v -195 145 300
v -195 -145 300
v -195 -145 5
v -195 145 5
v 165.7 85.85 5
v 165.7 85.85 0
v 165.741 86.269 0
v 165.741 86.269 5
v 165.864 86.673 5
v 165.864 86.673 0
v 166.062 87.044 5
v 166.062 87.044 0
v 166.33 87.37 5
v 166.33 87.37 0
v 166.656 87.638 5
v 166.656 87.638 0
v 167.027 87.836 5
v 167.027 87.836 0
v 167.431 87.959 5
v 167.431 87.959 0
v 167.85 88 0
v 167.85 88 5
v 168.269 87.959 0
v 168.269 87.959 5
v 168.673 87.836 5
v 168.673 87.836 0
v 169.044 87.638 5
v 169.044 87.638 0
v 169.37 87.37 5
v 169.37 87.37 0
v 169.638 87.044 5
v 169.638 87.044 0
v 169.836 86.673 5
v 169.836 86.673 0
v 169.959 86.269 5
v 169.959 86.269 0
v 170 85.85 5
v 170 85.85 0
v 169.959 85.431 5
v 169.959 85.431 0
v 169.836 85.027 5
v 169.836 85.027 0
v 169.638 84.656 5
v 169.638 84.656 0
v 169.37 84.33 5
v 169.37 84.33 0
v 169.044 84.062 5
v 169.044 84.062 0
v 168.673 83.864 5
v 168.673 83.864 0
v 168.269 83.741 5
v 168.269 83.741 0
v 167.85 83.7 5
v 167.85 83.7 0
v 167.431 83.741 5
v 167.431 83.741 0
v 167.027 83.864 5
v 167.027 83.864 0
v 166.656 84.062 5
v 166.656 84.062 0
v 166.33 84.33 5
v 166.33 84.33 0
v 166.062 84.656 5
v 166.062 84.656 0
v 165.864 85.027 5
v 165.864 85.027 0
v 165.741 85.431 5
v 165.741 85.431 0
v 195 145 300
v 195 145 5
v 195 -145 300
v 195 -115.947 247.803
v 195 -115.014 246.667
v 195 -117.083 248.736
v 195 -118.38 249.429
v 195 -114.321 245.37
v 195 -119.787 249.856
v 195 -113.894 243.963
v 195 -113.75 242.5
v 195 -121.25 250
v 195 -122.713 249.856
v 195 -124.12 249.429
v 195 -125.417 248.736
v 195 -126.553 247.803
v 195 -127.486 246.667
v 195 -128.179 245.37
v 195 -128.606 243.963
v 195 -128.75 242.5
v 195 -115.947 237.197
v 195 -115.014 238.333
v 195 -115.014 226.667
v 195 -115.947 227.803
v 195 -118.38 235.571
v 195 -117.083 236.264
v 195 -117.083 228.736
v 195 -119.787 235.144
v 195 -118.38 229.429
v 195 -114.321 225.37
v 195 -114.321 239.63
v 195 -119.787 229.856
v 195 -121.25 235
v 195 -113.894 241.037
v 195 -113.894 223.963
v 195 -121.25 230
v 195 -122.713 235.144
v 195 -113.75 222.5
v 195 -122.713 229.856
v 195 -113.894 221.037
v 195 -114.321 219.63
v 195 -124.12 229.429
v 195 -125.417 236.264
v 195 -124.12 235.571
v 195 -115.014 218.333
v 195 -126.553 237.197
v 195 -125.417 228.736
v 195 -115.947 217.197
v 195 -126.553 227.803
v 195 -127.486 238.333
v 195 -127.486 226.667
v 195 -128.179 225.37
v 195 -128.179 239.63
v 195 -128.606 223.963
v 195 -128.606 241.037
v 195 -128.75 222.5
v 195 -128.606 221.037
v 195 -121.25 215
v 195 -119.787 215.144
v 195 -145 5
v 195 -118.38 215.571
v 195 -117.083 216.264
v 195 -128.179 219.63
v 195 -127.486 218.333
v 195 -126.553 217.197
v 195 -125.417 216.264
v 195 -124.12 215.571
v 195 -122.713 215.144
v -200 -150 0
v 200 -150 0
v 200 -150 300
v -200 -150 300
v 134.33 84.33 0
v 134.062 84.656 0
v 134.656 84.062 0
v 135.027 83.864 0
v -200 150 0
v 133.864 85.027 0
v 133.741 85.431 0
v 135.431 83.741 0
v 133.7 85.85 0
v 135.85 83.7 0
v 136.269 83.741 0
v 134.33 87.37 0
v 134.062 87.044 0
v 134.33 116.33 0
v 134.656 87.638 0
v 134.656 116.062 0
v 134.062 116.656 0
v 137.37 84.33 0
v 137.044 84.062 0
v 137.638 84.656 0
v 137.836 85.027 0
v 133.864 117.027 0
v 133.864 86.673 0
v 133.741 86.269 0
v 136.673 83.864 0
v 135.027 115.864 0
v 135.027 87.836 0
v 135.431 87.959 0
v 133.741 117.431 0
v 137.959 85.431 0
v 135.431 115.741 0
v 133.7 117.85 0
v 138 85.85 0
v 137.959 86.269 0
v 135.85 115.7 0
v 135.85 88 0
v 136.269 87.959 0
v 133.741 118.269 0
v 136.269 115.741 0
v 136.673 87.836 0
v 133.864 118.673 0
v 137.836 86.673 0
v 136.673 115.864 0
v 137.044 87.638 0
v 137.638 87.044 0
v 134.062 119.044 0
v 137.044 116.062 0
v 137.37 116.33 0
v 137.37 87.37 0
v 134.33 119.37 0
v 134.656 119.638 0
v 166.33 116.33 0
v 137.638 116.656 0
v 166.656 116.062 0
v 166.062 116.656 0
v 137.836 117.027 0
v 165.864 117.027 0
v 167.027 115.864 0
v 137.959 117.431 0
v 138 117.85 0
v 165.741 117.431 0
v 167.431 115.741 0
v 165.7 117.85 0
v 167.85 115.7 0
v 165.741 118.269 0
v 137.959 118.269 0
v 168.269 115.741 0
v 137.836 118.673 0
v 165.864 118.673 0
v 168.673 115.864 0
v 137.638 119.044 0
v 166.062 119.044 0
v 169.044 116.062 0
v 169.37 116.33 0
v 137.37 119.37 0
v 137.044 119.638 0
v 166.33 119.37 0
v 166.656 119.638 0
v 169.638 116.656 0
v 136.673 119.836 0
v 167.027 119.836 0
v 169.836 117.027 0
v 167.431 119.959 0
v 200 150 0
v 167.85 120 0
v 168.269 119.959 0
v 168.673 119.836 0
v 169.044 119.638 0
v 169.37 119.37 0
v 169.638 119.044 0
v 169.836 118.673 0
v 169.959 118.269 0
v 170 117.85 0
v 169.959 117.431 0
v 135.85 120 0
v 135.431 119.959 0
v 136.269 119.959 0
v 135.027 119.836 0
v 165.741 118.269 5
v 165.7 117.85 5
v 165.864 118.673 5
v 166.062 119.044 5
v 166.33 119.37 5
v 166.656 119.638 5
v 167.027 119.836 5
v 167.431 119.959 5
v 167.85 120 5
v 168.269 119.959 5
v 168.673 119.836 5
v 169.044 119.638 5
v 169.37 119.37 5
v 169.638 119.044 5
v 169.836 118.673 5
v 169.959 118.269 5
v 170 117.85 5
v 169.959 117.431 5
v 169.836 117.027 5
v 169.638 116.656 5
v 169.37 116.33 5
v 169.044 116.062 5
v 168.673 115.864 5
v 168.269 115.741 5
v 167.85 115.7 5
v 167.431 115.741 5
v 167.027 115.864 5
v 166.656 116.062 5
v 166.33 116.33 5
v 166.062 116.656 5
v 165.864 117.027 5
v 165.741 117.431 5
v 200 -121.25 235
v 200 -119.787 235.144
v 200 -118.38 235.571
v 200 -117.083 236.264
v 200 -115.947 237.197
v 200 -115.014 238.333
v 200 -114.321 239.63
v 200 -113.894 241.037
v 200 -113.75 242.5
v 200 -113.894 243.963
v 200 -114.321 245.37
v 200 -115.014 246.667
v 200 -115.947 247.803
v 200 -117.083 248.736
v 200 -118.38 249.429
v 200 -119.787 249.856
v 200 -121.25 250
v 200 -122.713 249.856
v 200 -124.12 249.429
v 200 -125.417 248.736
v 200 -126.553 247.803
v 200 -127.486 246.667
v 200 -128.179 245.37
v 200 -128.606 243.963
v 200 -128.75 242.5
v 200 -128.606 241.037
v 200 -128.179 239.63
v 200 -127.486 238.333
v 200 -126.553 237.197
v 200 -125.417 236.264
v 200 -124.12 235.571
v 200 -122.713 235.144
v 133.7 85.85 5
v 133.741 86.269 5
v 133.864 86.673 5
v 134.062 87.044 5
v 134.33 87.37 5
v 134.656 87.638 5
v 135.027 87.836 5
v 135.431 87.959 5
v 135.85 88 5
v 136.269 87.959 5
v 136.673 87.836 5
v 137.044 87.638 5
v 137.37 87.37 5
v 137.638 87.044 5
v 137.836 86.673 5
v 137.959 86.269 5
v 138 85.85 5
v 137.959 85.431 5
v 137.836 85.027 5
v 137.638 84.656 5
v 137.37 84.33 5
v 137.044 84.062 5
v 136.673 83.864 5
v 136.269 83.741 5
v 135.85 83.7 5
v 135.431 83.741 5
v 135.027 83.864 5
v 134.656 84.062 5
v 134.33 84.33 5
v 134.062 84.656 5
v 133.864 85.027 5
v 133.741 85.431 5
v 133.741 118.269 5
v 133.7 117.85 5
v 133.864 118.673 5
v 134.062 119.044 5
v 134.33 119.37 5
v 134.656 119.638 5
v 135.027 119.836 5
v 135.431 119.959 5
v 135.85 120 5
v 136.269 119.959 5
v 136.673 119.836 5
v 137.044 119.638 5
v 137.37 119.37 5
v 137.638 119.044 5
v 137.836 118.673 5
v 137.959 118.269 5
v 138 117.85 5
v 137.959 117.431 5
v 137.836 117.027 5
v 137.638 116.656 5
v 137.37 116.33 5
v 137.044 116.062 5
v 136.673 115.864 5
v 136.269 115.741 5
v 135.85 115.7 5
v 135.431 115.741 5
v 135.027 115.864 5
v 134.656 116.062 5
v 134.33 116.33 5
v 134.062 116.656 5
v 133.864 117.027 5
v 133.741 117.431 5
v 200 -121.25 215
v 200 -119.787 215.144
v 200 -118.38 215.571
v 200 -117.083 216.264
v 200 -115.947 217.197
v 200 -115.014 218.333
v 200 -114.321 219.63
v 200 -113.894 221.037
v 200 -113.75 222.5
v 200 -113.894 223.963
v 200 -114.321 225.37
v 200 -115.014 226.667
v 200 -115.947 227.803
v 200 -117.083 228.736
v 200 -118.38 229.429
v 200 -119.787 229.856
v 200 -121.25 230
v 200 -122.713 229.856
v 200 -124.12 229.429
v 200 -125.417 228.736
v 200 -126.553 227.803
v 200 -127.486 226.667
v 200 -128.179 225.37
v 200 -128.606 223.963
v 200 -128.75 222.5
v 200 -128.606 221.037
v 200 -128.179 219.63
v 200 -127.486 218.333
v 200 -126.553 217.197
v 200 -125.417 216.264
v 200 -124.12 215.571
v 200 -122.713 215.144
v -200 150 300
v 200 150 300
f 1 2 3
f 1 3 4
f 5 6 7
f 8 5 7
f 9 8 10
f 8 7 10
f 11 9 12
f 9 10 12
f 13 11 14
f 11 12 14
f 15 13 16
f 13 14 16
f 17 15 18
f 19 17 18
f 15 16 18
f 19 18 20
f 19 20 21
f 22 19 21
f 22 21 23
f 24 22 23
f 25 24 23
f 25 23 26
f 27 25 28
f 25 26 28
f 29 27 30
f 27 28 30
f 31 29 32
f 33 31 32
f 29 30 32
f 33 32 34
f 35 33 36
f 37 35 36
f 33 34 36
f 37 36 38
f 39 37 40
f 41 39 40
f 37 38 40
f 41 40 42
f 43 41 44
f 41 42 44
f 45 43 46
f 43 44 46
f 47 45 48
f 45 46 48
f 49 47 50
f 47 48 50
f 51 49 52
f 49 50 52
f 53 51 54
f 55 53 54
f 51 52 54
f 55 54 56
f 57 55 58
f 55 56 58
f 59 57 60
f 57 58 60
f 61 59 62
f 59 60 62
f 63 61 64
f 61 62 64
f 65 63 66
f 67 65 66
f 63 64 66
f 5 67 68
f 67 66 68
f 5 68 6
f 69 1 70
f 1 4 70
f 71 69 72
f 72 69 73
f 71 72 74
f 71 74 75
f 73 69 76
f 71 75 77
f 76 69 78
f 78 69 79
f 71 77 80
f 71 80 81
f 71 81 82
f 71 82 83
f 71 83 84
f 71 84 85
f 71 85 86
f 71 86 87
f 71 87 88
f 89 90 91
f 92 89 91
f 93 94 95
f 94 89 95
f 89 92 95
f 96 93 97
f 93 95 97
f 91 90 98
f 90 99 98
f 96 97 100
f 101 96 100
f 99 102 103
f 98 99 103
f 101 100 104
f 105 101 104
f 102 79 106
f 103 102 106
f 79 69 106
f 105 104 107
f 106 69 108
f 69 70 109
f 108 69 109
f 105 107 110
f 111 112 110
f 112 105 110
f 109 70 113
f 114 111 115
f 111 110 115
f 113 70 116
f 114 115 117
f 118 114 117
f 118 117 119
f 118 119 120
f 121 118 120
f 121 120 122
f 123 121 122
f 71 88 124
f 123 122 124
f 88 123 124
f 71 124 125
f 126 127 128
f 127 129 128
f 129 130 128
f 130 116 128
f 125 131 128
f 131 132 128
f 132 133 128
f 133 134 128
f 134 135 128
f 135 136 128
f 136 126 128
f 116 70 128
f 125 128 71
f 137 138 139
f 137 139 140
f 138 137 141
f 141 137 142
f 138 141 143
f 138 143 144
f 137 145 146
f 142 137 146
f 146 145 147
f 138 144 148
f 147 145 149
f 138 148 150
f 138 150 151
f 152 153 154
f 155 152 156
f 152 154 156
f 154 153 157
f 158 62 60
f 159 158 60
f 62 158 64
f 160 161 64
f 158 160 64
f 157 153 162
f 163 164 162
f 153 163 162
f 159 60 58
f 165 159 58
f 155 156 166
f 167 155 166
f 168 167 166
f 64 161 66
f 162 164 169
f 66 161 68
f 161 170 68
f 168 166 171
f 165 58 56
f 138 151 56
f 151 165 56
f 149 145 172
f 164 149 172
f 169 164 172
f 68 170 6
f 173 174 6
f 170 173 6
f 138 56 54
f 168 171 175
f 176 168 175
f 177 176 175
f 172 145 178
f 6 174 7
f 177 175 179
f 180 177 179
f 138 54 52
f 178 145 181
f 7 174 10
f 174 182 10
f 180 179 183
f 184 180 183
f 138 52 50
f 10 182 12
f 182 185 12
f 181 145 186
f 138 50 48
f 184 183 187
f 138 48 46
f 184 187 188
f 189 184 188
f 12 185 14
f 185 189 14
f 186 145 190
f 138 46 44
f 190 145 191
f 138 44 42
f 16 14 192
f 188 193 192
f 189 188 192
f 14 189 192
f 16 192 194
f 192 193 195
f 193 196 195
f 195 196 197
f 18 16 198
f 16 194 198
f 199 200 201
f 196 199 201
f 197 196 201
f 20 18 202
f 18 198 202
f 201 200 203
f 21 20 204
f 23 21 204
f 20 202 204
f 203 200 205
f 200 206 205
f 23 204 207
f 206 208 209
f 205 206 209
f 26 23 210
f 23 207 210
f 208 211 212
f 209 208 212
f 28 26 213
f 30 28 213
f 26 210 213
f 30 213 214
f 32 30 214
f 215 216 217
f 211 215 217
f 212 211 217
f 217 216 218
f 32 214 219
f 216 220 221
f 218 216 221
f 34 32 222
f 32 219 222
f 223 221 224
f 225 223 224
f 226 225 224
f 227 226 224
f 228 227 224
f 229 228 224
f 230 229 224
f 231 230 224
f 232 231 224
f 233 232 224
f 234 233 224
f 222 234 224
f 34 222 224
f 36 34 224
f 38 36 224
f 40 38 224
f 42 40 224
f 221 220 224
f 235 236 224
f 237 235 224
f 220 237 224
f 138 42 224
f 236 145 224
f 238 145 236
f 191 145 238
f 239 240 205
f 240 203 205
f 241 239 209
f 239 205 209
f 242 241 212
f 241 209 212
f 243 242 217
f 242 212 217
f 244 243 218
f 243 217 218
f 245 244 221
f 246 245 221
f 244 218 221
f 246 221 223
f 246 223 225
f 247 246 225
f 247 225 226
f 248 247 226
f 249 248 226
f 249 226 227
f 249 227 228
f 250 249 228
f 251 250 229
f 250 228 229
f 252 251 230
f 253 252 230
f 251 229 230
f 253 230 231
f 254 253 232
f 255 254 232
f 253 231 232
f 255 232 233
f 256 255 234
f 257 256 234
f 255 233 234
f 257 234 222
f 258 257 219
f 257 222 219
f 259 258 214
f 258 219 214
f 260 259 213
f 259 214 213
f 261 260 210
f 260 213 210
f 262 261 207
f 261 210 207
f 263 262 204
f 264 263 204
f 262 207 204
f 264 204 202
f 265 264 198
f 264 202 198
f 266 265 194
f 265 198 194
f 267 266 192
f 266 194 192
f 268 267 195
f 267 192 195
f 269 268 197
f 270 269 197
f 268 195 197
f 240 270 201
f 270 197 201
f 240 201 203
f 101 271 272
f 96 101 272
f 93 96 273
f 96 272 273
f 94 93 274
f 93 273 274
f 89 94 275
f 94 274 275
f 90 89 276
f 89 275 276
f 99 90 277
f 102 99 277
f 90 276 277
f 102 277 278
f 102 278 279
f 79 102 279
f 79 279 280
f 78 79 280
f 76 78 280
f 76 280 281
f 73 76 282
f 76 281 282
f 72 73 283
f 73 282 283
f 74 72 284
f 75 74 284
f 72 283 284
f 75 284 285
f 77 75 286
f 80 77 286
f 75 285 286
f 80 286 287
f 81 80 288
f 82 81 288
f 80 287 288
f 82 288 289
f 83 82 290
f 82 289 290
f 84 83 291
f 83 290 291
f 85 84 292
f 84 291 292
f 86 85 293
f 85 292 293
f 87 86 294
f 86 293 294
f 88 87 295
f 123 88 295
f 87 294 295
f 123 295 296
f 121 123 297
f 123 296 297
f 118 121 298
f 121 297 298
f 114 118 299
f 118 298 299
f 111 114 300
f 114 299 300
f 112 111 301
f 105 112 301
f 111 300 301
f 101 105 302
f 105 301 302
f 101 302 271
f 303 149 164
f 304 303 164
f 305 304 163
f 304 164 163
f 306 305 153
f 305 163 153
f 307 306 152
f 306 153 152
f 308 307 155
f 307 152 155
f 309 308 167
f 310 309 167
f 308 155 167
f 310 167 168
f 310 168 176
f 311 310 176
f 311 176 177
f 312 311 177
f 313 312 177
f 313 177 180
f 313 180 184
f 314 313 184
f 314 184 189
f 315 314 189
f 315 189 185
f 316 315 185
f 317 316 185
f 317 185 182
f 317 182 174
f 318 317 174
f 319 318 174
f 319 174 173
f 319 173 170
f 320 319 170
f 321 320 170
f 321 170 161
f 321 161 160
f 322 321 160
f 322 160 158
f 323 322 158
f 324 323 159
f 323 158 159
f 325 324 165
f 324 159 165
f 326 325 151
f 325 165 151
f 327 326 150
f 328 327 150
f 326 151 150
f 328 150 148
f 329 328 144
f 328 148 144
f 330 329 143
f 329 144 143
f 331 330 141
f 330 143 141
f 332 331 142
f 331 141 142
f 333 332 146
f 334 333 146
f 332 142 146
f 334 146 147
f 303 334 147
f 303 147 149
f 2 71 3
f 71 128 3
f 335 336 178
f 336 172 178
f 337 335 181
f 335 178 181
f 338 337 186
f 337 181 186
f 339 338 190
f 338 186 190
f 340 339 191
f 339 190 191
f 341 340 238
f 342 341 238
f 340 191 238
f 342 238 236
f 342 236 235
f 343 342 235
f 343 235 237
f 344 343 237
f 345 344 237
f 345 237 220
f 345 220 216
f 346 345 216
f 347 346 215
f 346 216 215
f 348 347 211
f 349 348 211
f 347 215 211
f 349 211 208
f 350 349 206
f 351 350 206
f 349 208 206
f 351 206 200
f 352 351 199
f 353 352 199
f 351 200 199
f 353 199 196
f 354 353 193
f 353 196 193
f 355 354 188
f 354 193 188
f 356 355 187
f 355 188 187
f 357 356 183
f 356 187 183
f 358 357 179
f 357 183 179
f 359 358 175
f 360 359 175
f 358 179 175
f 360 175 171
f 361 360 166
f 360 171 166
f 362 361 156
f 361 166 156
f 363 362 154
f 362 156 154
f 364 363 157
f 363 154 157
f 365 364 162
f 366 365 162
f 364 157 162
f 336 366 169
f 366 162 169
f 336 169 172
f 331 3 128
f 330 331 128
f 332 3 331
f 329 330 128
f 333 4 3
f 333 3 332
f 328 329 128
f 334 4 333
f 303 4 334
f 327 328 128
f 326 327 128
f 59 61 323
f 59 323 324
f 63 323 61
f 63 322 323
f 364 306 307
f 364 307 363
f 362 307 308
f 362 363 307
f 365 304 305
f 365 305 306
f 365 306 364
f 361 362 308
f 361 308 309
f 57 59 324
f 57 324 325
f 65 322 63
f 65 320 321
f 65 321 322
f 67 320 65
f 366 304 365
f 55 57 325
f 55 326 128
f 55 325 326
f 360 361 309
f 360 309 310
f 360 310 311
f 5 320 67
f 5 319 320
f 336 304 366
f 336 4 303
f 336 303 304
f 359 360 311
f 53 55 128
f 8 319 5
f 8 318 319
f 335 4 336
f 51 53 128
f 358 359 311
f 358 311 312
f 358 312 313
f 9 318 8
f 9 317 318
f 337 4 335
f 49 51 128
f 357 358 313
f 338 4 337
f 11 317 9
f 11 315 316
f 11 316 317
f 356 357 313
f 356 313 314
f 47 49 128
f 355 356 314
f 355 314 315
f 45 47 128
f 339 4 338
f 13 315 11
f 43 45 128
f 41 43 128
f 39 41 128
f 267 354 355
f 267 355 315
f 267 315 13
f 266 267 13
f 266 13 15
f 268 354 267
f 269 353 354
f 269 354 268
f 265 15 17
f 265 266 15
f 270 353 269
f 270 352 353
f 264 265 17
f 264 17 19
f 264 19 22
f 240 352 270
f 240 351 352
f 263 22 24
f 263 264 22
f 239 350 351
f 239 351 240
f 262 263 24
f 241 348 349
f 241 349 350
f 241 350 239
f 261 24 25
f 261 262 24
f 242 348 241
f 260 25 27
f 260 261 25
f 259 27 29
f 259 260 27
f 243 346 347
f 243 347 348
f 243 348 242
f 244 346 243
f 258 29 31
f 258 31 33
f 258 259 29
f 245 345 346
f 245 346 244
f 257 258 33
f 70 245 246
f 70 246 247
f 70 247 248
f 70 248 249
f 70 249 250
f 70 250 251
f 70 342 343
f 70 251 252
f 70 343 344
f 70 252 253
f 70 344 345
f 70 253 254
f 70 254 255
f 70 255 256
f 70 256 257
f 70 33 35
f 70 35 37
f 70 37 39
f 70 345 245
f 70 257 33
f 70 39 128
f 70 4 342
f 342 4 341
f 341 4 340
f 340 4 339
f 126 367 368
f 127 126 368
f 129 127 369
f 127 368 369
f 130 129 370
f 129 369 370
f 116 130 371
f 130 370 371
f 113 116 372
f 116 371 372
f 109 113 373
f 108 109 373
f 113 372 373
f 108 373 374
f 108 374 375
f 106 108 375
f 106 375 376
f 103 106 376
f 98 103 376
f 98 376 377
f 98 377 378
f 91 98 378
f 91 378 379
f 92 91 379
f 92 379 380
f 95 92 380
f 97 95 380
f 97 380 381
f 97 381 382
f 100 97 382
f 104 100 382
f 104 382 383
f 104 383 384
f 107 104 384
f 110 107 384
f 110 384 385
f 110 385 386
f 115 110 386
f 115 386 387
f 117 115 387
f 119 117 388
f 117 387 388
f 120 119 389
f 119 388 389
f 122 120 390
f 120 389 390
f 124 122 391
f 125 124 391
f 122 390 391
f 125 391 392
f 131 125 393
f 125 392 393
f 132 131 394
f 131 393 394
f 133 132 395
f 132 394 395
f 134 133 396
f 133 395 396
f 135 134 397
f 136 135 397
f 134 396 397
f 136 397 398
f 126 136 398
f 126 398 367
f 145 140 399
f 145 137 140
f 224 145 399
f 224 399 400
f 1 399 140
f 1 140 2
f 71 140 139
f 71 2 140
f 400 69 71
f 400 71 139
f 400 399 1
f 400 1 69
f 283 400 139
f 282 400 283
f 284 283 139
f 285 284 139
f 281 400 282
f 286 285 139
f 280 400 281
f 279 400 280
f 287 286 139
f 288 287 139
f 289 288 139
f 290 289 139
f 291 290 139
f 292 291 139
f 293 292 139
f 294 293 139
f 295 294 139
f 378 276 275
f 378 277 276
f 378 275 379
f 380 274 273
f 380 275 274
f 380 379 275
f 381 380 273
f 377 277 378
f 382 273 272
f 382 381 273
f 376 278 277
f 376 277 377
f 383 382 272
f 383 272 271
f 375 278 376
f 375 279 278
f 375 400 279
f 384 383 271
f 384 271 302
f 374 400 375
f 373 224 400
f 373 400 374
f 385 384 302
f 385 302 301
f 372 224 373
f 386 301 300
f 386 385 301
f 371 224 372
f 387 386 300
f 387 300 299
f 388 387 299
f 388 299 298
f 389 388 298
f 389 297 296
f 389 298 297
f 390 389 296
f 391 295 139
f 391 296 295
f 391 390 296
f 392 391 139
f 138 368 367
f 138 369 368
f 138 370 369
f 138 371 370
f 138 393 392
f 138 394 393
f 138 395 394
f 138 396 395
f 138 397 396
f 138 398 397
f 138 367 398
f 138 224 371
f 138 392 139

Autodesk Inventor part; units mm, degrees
ref_plane "YZ Plane" through (0, 0, 0) normal (1, 0, 0) x (0, 1, 0)
ref_plane "XZ Plane" through (0, 0, 0) normal (0, 1, 0) x (-1, 0, 0)
ref_plane "XY Plane" through (0, 0, 0) normal (0, 0, 1) x (1, 0, 0)
sketch "Sketch2" plane through (0, 0, 0) normal (0, 0, 1) x (1, 0, 0)
  line L0 (200, -150) -> (-200, -150)
  line L1 (-200, -150) -> (-200, 150)
  line L2 (-200, 150) -> (200, 150)
  line L3 (200, 150) -> (200, -150)
  line L4 (200, -150) -> (-200, 150) construction
  line L5 (-200, -150) -> (200, 150) construction
  point P0 (0, 0)
  dimension "d0" = 400
  dimension "d1" = 300
extrude "Base" add sketch "Sketch2" along normal blind 300
shell "Shell1" thickness 5 removed faces 1 at (66.6667, -50, 300)
sketch "Sketch3" plane through (0, 0, 0) normal (0, 0, -1) x (-1, 0, 0)
  circle A0 centre (-167.85, 85.85) radius 2.15
  line L0 (-200, 150) -> (200, 150) construction
  line L1 (-200, 150) -> (200, 150) construction
  line L2 (200, 150) -> (200, -150) construction
  line L3 (200, -150) -> (-200, -150) construction
  line L4 (-200, -150) -> (-200, 150) construction
  circle A1 centre (-135.85, 85.85) radius 2.15
  circle A2 centre (-167.85, 117.85) radius 2.15
  circle A3 centre (-135.85, 117.85) radius 2.15
  point P0 (0, 0)
  dimension "d5" = 4.3
  dimension "d8" = 32
  dimension "d11" = 32
  dimension "d14" = 32.15
  dimension "d15" = 32.15
extrude "40 mm fan mout holes" cut sketch "Sketch3" against normal up to surface (5 mm away)
sketch "Sketch4" plane through (200, -150, 0) normal (1, 0, 0) x (0, 0, -1)
  circle A0 centre (-242.5, 28.75) radius 7.5
  line L0 (-300, 0) -> (-300, 300) projected
  line L1 (0, 0) -> (-300, 0) projected
  circle A1 centre (-222.5, 28.75) radius 7.5
  point P0 (0, 150)
  dimension "d18" = 15
  dimension "d19" = 57.5
  dimension "d20" = 28.75
  dimension "d23" = 20
extrude "Cable Holes" cut sketch "Sketch4" against normal up to surface (5 mm away)
equation "\"d15\" = d14"
equation "\"d20\" = 0.5 * d19"
properties part number "mouse_SP_box"
